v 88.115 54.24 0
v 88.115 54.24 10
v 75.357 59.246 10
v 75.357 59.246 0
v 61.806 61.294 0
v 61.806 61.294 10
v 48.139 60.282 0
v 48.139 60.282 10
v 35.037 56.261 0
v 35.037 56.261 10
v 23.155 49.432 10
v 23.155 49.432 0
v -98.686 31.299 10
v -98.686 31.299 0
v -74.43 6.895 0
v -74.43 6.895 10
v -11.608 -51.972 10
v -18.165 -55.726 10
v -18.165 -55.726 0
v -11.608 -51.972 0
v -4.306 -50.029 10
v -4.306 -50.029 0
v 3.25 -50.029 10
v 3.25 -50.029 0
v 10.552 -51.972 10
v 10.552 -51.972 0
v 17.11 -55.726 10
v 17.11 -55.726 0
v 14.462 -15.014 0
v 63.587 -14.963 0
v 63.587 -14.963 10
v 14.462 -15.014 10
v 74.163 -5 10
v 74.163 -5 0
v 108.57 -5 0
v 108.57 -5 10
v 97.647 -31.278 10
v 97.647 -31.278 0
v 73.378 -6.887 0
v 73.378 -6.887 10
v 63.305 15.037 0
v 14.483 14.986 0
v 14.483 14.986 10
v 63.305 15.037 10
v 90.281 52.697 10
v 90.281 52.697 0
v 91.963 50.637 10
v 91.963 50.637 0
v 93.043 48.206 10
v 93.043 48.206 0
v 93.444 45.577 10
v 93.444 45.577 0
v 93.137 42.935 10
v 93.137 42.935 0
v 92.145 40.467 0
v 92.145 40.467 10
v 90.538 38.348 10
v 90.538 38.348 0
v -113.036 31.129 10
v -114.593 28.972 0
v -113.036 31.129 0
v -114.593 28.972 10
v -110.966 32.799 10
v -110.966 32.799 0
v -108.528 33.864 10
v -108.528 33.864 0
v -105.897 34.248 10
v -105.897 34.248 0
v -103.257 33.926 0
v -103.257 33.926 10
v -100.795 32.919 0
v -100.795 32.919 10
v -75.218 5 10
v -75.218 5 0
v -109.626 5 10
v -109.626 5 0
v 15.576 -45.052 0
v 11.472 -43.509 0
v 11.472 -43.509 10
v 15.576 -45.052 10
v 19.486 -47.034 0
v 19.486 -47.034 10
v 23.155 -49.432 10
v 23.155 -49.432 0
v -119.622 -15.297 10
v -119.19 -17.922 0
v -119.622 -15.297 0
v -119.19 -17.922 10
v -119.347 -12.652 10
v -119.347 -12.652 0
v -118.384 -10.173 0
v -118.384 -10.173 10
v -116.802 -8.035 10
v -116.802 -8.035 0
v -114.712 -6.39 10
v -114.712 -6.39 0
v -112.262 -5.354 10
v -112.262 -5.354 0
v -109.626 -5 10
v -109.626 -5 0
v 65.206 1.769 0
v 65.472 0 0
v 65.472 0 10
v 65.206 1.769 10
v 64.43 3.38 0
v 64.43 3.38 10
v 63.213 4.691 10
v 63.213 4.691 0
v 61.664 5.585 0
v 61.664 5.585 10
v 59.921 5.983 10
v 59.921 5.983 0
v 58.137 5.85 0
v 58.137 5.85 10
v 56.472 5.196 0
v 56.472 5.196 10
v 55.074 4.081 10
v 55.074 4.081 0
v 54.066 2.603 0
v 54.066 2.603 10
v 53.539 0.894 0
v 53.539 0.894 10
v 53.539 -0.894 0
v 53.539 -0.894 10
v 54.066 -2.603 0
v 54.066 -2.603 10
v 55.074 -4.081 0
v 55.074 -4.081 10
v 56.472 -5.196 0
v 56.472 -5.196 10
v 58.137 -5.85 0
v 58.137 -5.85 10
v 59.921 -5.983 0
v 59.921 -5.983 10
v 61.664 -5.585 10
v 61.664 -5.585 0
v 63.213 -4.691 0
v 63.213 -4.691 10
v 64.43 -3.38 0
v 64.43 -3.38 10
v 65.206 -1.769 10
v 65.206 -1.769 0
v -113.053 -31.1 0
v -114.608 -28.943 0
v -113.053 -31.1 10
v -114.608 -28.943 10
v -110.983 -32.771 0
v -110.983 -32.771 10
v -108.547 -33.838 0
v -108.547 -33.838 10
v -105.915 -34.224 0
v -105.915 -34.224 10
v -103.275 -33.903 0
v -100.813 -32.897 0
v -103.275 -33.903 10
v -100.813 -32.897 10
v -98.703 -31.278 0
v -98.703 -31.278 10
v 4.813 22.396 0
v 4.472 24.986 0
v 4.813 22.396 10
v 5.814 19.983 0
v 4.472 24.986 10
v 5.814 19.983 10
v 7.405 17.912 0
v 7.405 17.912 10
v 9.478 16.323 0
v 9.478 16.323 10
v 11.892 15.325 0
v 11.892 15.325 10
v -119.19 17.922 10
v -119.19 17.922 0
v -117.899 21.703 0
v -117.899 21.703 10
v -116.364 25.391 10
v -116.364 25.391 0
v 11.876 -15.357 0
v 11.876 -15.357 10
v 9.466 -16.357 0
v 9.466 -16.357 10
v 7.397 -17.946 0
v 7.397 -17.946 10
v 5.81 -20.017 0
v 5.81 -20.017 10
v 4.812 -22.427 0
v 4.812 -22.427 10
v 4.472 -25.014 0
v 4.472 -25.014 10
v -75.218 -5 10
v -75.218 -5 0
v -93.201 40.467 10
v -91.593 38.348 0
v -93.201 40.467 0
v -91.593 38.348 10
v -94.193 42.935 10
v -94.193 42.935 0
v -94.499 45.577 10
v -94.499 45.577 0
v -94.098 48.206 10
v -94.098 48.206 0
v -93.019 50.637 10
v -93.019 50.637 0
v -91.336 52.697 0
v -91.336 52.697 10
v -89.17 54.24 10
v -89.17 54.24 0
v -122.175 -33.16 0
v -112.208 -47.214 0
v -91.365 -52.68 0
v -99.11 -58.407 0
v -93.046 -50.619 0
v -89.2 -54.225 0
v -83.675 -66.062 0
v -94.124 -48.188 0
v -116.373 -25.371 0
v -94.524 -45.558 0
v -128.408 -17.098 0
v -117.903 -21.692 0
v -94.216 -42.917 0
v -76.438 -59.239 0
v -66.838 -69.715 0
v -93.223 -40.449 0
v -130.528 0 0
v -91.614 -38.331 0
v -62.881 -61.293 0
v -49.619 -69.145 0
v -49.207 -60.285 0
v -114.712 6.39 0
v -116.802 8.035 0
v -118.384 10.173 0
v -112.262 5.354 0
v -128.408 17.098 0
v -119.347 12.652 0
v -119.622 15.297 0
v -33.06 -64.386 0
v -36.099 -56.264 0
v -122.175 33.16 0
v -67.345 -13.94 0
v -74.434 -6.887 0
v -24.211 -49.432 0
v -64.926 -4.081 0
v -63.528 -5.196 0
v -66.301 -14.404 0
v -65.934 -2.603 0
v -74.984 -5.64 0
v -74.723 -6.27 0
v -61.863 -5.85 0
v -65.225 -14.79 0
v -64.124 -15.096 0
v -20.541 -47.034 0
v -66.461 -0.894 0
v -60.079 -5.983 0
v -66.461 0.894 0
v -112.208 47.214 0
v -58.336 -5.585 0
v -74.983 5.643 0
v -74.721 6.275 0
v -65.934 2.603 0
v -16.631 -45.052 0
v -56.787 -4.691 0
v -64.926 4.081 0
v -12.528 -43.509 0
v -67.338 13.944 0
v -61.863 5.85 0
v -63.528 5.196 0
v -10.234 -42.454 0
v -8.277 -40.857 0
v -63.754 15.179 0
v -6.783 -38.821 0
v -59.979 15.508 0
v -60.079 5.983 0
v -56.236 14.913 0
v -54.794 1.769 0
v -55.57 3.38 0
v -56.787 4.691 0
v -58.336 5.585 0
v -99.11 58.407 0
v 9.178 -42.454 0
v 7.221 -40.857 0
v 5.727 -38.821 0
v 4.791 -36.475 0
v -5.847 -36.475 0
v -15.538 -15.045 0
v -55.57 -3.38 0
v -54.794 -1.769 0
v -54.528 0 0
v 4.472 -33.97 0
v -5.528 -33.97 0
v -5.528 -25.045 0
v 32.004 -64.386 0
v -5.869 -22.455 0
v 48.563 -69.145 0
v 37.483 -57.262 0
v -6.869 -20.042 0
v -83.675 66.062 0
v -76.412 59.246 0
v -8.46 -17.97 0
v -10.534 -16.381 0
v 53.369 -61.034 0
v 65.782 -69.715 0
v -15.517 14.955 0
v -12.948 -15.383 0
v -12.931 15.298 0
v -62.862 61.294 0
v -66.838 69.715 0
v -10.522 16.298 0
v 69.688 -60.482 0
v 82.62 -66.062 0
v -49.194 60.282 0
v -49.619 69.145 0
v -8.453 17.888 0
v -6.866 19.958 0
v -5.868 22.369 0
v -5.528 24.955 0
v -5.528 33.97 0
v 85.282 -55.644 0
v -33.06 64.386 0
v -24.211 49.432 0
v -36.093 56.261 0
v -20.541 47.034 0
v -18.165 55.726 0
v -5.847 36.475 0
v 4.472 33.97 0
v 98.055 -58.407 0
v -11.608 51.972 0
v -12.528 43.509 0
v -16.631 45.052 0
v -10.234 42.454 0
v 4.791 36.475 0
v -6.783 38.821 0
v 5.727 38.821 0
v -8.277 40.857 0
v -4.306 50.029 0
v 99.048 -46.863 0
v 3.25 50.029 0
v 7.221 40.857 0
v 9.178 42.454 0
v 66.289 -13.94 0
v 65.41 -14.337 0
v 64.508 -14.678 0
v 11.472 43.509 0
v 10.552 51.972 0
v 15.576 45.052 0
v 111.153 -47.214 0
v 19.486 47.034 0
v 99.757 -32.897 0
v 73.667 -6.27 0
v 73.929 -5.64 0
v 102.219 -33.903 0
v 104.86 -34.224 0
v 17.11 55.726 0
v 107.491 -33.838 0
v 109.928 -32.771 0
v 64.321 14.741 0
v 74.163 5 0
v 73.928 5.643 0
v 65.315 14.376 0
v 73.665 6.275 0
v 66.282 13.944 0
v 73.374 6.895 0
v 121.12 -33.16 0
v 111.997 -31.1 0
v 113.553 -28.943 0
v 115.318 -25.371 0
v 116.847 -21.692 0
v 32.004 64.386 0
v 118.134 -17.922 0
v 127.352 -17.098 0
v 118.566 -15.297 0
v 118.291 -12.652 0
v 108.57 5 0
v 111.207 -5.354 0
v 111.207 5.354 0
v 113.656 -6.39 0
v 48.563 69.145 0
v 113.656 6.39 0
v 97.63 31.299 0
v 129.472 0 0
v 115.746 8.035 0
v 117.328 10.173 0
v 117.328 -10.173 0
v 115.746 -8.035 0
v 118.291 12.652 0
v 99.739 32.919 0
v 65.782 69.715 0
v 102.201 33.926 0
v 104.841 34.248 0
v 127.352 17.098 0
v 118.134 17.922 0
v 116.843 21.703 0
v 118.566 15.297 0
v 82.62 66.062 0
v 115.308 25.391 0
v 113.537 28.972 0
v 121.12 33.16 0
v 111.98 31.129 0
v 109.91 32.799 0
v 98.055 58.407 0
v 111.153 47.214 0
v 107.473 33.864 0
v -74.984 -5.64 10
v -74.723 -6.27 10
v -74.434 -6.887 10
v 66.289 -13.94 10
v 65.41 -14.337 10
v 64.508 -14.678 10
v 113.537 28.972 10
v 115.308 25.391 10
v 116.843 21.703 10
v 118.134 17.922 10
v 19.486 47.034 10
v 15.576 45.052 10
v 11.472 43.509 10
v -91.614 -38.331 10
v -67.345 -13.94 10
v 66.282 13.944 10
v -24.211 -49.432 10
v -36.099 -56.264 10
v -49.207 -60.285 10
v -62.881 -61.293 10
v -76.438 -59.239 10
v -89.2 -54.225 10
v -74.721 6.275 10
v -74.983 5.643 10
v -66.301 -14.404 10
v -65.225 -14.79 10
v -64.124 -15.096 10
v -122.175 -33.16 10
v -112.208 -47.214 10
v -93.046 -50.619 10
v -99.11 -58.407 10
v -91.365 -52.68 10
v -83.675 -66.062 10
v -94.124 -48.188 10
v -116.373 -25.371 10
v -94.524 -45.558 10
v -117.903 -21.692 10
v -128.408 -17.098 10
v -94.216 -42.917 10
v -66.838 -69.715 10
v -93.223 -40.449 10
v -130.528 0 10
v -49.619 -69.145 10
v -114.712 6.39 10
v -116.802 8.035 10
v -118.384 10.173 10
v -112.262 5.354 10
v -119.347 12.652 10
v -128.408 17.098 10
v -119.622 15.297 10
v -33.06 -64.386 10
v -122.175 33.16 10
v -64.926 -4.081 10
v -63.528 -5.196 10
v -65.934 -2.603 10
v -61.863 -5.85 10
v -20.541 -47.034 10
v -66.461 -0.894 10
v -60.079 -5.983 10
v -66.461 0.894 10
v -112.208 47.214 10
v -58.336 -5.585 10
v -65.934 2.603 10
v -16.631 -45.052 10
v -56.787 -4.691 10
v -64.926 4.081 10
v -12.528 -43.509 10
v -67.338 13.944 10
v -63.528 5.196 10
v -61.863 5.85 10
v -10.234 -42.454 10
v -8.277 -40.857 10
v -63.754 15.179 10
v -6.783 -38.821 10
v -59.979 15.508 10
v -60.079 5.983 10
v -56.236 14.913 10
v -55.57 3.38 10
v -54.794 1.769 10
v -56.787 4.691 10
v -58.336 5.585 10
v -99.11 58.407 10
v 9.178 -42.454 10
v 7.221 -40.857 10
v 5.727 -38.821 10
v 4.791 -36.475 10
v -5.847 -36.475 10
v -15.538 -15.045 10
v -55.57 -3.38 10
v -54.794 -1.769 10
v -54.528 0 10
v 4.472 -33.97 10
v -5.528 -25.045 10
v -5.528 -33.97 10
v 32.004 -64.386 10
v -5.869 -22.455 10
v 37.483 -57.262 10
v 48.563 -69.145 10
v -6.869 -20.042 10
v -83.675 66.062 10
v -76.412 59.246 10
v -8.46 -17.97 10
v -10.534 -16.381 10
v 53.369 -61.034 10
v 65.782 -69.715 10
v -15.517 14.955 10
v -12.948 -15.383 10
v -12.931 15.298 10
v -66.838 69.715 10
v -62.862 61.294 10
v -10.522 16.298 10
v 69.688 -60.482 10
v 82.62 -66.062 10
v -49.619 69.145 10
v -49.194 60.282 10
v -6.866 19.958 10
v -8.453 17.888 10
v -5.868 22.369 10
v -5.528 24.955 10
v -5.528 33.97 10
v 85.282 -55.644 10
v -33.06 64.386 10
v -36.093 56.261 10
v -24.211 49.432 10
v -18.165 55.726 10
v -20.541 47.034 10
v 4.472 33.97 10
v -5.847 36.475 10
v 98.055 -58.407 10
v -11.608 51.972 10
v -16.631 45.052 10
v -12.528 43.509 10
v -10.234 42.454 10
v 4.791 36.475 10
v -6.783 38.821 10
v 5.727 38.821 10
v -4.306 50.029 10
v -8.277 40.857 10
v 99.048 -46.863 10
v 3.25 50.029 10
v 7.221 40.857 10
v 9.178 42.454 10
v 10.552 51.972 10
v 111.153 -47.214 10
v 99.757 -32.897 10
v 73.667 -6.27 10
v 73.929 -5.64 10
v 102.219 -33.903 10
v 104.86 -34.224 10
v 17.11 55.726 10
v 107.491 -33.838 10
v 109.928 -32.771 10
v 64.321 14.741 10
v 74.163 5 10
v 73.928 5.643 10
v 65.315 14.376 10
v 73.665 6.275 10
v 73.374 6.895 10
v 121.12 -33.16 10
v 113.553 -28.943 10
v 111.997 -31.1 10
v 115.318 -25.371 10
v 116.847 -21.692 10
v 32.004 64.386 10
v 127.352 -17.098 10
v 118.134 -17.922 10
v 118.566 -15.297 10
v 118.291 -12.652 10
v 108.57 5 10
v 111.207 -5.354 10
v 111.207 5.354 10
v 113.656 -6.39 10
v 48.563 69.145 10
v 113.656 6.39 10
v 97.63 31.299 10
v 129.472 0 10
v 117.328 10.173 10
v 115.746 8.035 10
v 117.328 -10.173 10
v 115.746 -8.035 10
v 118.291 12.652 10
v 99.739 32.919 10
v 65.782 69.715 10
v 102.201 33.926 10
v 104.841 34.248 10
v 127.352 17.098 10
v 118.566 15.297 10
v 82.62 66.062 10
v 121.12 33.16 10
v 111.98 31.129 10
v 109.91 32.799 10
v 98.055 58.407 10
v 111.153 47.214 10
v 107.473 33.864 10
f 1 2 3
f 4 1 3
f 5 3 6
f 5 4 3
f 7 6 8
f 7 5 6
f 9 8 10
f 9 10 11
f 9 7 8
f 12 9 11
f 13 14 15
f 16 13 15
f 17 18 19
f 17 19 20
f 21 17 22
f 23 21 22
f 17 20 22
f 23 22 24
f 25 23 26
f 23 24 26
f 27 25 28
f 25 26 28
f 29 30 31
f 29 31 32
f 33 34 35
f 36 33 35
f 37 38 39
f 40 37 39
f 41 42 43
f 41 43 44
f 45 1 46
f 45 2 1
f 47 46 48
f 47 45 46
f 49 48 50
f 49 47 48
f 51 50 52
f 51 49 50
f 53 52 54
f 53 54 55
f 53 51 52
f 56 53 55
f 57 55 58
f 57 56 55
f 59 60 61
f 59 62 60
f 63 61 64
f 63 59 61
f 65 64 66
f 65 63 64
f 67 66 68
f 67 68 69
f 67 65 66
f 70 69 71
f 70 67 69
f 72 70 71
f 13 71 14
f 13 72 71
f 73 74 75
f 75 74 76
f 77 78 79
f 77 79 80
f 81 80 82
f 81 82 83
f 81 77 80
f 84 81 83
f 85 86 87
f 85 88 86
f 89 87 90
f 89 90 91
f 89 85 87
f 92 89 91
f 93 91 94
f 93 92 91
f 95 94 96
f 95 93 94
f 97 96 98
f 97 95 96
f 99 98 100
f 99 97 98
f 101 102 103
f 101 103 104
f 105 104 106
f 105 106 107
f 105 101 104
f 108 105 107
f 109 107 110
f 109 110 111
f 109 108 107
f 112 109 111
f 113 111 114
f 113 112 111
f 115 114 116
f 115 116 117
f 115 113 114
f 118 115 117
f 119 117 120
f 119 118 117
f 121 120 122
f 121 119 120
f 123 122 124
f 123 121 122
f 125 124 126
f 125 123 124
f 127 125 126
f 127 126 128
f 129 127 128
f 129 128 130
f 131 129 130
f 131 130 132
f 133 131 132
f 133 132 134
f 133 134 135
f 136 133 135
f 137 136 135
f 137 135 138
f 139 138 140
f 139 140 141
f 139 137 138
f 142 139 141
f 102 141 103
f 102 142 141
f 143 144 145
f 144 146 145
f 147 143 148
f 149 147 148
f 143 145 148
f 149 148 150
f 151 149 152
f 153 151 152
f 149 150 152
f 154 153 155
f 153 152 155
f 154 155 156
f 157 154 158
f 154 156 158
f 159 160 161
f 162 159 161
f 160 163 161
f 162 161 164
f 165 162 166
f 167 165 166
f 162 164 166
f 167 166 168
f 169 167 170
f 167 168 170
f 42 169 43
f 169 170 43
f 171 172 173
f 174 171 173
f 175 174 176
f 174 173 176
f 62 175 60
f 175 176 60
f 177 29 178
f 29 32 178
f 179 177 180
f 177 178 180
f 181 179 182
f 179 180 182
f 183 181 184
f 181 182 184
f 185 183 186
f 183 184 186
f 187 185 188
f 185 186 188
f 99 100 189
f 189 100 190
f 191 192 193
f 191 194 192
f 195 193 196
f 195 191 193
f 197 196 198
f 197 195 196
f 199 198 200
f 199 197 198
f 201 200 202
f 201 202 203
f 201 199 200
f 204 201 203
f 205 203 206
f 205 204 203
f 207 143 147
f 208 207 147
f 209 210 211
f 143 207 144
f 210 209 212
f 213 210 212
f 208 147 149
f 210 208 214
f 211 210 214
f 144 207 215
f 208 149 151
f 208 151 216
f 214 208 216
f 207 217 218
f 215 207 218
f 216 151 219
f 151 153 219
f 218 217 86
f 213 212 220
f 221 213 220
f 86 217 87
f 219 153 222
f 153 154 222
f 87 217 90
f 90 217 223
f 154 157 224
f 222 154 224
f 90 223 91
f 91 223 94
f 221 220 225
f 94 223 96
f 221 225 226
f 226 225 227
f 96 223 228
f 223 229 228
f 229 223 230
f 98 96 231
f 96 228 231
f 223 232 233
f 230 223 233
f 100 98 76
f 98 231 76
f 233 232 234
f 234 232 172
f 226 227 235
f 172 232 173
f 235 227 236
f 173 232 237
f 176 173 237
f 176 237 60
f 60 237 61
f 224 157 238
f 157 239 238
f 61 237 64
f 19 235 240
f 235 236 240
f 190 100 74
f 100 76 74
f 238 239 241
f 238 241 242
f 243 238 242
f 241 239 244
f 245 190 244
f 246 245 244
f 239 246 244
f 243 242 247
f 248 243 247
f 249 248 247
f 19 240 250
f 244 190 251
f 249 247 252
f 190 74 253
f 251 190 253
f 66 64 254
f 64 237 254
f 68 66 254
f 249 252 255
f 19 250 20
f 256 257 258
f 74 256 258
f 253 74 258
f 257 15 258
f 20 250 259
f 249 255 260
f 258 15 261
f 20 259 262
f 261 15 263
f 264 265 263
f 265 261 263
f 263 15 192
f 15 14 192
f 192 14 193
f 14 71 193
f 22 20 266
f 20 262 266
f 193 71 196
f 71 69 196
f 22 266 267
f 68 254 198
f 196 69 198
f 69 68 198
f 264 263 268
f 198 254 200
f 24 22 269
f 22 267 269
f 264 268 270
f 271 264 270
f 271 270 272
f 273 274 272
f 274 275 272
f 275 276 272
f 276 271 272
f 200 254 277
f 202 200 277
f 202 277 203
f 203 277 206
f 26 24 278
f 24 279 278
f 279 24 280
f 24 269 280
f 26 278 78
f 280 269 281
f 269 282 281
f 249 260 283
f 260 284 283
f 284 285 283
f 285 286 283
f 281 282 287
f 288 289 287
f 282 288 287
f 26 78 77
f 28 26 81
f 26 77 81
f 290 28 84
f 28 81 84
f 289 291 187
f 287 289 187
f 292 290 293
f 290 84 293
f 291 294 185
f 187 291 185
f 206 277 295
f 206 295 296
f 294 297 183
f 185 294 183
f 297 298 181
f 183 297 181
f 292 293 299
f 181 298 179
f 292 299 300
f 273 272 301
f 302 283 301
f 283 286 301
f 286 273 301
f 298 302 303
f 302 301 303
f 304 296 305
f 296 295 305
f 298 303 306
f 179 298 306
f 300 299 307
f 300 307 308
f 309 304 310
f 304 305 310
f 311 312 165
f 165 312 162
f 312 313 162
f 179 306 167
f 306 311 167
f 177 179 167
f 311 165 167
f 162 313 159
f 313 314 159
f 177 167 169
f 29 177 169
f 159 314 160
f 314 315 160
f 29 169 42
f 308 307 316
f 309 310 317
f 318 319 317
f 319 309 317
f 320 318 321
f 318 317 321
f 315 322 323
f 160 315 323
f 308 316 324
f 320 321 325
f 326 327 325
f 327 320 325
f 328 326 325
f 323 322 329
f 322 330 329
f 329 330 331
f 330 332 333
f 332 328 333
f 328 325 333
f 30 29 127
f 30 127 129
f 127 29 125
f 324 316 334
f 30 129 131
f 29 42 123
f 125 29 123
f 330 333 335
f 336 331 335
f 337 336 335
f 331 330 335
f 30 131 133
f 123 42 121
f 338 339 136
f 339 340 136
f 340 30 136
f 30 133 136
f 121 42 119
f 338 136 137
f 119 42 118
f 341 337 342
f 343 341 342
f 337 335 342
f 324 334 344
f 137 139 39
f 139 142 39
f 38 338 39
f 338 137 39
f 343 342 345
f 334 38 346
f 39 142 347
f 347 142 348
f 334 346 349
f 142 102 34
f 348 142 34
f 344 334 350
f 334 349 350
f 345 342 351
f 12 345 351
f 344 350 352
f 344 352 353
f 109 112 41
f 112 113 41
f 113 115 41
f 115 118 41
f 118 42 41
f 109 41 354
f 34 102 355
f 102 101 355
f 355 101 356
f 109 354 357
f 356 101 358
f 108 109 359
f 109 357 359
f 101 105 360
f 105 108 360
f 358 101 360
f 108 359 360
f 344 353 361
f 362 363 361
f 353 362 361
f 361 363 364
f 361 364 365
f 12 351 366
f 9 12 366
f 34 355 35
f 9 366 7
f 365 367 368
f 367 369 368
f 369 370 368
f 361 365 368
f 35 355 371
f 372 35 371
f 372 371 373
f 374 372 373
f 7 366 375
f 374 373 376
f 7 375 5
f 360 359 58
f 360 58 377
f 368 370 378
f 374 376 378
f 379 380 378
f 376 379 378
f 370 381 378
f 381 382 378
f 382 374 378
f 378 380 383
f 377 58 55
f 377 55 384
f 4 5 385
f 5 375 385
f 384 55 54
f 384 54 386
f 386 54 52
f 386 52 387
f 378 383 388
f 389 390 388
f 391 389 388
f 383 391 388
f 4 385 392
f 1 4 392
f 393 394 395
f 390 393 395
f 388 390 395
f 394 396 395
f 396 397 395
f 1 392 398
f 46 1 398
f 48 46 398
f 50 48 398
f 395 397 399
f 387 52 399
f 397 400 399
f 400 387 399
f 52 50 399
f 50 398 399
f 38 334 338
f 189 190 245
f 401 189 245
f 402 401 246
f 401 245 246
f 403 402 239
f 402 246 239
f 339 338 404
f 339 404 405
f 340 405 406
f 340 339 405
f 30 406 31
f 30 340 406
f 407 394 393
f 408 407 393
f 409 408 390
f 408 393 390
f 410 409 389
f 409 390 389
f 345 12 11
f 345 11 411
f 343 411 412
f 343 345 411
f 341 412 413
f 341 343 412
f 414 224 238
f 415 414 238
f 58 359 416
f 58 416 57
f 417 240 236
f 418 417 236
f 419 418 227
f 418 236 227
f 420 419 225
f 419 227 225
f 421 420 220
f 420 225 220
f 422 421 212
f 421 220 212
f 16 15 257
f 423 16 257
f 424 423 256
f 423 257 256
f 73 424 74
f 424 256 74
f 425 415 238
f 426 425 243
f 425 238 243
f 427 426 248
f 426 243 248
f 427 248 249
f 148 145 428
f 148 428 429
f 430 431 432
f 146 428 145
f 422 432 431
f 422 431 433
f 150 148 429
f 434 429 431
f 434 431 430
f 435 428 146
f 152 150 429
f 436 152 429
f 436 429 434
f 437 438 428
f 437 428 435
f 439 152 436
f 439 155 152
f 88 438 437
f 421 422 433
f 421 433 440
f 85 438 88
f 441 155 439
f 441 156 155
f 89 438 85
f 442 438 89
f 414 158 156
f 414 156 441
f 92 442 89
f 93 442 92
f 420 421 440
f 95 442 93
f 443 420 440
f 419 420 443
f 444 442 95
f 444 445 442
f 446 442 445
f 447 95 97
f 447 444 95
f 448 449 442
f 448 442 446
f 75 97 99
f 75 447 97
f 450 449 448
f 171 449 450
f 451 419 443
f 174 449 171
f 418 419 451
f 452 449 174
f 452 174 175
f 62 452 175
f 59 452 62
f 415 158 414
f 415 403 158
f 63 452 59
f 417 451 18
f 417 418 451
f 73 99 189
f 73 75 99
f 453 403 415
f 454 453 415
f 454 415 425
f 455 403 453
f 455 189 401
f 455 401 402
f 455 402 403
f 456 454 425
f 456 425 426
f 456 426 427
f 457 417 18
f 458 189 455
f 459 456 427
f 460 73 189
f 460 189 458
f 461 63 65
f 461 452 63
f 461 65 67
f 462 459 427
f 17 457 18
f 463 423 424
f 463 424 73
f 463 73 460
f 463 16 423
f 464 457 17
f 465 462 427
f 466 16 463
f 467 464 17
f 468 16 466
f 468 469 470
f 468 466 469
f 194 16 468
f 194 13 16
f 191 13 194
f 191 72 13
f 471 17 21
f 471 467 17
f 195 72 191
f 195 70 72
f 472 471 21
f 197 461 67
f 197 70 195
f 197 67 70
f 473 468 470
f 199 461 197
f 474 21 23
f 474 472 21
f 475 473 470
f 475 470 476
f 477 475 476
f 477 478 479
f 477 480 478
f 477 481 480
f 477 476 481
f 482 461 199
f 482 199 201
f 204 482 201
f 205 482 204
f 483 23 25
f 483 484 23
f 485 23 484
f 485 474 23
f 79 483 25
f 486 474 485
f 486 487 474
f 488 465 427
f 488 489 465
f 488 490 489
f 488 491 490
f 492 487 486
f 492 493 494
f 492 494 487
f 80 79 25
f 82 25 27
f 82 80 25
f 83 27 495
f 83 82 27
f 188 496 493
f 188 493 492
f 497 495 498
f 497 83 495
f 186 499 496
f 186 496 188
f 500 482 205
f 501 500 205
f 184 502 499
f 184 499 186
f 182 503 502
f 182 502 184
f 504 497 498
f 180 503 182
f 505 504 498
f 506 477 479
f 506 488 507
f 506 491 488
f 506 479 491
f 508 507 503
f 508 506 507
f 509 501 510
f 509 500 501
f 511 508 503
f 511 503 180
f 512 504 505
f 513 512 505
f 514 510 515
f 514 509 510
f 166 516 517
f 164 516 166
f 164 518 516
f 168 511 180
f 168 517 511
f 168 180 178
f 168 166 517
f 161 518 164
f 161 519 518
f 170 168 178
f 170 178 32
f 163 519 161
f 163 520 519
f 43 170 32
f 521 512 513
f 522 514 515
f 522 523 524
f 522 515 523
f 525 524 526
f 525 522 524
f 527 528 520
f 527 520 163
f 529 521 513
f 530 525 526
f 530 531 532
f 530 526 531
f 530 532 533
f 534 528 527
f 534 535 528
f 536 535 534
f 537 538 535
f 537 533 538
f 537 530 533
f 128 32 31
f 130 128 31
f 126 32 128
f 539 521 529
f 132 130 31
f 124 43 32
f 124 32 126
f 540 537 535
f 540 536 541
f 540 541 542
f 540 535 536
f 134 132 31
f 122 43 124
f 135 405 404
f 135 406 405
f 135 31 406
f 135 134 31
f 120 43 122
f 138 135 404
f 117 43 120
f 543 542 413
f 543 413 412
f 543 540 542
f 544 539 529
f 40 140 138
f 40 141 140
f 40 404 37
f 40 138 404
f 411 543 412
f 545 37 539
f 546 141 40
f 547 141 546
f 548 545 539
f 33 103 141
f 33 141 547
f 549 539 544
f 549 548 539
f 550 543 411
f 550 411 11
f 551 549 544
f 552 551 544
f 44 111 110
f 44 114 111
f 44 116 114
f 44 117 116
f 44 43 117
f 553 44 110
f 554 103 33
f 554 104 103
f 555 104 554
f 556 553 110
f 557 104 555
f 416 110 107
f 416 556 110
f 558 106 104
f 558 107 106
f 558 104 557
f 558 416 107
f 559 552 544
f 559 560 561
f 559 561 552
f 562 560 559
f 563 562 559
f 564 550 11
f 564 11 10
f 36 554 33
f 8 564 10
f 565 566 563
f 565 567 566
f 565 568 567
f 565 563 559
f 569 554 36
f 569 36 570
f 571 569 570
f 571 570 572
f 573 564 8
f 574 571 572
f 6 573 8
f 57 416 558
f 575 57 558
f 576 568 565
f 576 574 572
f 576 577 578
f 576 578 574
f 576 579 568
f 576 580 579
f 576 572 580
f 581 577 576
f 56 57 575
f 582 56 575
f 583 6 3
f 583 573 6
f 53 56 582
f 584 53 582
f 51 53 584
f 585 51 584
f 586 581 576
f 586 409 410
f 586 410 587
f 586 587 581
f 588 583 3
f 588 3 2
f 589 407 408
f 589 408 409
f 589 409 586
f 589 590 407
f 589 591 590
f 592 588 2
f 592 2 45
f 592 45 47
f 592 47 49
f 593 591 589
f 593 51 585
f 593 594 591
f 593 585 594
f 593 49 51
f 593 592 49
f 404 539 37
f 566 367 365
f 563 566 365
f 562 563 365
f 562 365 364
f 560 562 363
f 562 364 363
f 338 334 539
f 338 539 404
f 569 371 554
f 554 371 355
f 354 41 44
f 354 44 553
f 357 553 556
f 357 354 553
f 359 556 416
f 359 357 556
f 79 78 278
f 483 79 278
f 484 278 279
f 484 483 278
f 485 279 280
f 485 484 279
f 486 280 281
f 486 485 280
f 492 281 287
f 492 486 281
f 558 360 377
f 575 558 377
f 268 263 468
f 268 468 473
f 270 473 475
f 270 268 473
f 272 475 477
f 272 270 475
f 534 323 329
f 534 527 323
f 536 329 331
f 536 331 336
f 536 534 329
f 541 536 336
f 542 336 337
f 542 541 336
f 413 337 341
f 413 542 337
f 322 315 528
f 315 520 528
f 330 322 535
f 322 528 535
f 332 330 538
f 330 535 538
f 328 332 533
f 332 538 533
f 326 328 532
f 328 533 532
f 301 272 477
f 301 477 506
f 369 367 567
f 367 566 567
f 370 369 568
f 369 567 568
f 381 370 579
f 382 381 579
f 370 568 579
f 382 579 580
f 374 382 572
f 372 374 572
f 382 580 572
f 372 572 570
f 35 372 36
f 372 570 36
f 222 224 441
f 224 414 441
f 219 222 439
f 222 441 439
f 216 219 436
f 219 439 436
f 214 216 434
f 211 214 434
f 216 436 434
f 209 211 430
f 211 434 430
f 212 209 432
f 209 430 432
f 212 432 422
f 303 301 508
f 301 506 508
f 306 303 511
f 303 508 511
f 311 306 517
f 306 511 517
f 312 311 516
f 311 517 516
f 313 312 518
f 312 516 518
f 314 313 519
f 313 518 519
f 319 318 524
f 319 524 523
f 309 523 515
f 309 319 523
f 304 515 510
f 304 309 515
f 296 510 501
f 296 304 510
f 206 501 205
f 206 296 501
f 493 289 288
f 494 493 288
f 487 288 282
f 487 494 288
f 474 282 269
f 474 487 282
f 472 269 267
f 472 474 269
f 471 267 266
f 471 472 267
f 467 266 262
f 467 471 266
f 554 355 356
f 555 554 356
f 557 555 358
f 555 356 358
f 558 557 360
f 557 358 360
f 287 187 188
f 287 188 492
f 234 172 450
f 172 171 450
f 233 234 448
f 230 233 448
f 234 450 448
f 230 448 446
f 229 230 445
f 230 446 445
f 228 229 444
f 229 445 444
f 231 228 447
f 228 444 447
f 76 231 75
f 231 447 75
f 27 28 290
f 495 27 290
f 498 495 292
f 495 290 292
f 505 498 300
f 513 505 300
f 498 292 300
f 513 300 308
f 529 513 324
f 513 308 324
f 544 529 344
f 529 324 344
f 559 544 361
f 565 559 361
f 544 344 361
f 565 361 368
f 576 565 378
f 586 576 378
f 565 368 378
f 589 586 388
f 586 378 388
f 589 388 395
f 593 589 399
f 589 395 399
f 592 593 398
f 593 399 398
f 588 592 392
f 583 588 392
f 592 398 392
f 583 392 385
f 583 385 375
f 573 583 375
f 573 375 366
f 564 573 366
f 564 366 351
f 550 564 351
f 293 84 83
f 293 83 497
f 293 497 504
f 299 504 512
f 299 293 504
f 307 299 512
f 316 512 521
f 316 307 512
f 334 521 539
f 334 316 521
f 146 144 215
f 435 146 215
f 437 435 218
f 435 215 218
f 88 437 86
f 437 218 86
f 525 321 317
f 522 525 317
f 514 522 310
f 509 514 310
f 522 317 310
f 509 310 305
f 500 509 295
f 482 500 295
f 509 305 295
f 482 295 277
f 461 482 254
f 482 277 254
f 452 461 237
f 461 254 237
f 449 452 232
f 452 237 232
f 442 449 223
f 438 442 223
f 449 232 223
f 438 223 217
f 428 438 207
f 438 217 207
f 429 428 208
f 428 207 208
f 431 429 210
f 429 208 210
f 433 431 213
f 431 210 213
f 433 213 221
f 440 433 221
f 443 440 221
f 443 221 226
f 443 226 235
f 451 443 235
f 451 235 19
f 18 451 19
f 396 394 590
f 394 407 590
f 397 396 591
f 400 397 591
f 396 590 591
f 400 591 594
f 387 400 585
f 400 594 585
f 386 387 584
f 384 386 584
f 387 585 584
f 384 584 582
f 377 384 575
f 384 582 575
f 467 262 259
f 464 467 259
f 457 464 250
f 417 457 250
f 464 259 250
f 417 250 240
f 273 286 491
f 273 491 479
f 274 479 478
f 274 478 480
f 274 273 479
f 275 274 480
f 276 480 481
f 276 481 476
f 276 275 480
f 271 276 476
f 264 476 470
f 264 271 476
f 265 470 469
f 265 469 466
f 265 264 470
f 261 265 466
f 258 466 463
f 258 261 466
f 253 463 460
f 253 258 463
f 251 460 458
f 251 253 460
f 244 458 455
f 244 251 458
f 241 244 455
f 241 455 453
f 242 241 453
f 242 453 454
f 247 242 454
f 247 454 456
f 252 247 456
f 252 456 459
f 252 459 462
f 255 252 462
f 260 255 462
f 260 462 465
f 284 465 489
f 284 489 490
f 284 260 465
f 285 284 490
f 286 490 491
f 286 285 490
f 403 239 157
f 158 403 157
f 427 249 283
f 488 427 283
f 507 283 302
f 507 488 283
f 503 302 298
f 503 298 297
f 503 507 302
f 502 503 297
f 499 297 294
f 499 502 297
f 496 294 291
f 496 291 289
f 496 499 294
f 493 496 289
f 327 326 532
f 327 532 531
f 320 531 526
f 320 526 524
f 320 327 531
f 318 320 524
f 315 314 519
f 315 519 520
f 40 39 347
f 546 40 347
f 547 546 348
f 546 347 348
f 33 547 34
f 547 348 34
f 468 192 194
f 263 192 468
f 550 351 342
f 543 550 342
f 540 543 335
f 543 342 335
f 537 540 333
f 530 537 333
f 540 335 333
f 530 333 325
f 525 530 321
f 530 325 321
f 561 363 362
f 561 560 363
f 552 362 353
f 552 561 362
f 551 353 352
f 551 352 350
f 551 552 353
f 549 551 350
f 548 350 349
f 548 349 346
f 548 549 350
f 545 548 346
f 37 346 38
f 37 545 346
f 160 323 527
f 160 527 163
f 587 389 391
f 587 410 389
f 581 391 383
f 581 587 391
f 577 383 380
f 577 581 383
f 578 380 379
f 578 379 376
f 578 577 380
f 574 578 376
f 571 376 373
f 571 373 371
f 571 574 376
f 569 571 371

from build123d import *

# Parameters (mm, degrees)
SKETCH1_R           = 6
BOSS_EXTRUDE2_DEPTH = 10
FILLET2_R           = 10


with BuildPart() as part:
    # Sketch1 → Boss-Extrude2 (new body)
    with BuildSketch(Plane.XY):
        with BuildLine():
            ThreePointArc((-18.165151778, 55.726150839), (-130.527825355, 0), (-18.165151778, -55.726150839))
            ThreePointArc((-18.165151778, -55.726150839), (-0.527825355, -49.783359328), (17.109501067, -55.726150839))
            ThreePointArc((17.109501067, -55.726150839), (129.472174645, 0), (17.109501067, 55.726150839))
            ThreePointArc((17.109501067, 55.726150839), (-0.527825355, 49.783359328), (-18.165151778, 55.726150839))
        make_face()
        with Locations((-60.527825355, 0)):
            Circle(SKETCH1_R, mode=Mode.SUBTRACT)
        with Locations((59.472174645, 0)):
            Circle(SKETCH1_R, mode=Mode.SUBTRACT)
        with BuildLine():
            Line((-56.235975609, 14.912672635), (-5.527825355, 14.965504266))
            Line((-5.527825355, 14.965504266), (-5.527825355, 41.980686961))
            ThreePointArc((-5.527825355, 41.980686961), (-15.345309937, 44.512654742), (-24.210827936, 49.431643964))
            ThreePointArc((-24.210827936, 49.431643964), (-62.58583764, 61.303966527), (-100.078223296, 46.884728315))
            Line((-100.078223296, 46.884728315), (-67.337537784, 13.944016494))
            ThreePointArc((-67.337537784, 13.944016494), (-61.876707041, 15.459246345), (-56.235975609, 14.912672635))
        make_face(mode=Mode.SUBTRACT)
        with BuildLine():
            Line((-64.123905218, -15.095561897), (-5.527825355, -15.034512017))
            Line((-5.527825355, -15.034512017), (-5.527825355, -41.980686961))
            ThreePointArc((-5.527825355, -41.980686961), (-15.345309937, -44.512654742), (-24.210827936, -49.431643964))
            ThreePointArc((-24.210827936, -49.431643964), (-62.602390706, -61.303408593), (-100.103536918, -46.863362884))
            Line((-100.103536918, -46.863362884), (-67.345067046, -13.940336979))
            ThreePointArc((-67.345067046, -13.940336979), (-65.766427516, -14.607012931), (-64.123905218, -15.095561897))
        make_face(mode=Mode.SUBTRACT)
        with BuildLine():
            Line((-107.170792468, 39.835227443), (-74.430106955, 6.894515622))
            ThreePointArc((-74.430106955, 6.894515622), (-74.855512615, 5.960298411), (-75.218222877, 5))
            Line((-75.218222877, 5), (-121.6621997, 5))
            ThreePointArc((-121.6621997, 5), (-117.161402857, 23.559491206), (-107.170792468, 39.835227443))
        make_face(mode=Mode.SUBTRACT)
        with BuildLine():
            Line((-121.6621997, -5), (-75.218222877, -5))
            ThreePointArc((-75.218222877, -5), (-74.857121477, -5.956429468), (-74.433828207, -6.887006899))
            Line((-74.433828207, -6.887006899), (-107.192298079, -39.810032805))
            ThreePointArc((-107.192298079, -39.810032805), (-117.167762266, -23.544198292), (-121.6621997, -5))
        make_face(mode=Mode.SUBTRACT)
        with BuildLine():
            Line((4.472174645, 41.980686961), (4.472174645, 14.975923031))
            Line((4.472174645, 14.975923031), (63.304903434, 15.03721947))
            ThreePointArc((63.304903434, 15.03721947), (64.821395332, 14.56686711), (66.281887074, 13.944016494))
            Line((66.281887074, 13.944016494), (99.022572586, 46.884728315))
            ThreePointArc((99.022572586, 46.884728315), (61.530186929, 61.303966527), (23.155177226, 49.431643964))
            ThreePointArc((23.155177226, 49.431643964), (14.289659226, 44.512654742), (4.472174645, 41.980686961))
        make_face(mode=Mode.SUBTRACT)
        with BuildLine():
            Line((99.047886208, -46.863362884), (66.289416336, -13.940336979))
            ThreePointArc((66.289416336, -13.940336979), (64.962019266, -14.514454361), (63.586938832, -14.962502967))
            Line((63.586938832, -14.962502967), (4.472174645, -15.024093252))
            Line((4.472174645, -15.024093252), (4.472174645, -41.980686961))
            ThreePointArc((4.472174645, -41.980686961), (14.289659226, -44.512654742), (23.155177226, -49.431643964))
            ThreePointArc((23.155177226, -49.431643964), (61.546739995, -61.303408593), (99.047886208, -46.863362884))
        make_face(mode=Mode.SUBTRACT)
        with BuildLine():
            Line((106.136647368, -39.810032805), (73.378177497, -6.887006899))
            ThreePointArc((73.378177497, -6.887006899), (73.801470767, -5.956429468), (74.162572167, -5))
            Line((74.162572167, -5), (120.606548989, -5))
            ThreePointArc((120.606548989, -5), (116.112111556, -23.544198292), (106.136647368, -39.810032805))
        make_face(mode=Mode.SUBTRACT)
        with BuildLine():
            Line((120.606548989, 5), (74.162572167, 5))
            ThreePointArc((74.162572167, 5), (73.799861904, 5.960298411), (73.374456245, 6.894515622))
            Line((73.374456245, 6.894515622), (106.115141757, 39.835227443))
            ThreePointArc((106.115141757, 39.835227443), (116.105752147, 23.559491206), (120.606548989, 5))
        make_face(mode=Mode.SUBTRACT)
    extrude(amount=BOSS_EXTRUDE2_DEPTH)

    # Fillet2
    fillet2_edges = [part.edges().sort_by_distance(p)[0] for p in [
        (4.472174645, -15.024093252, 5),
        (4.472174645, -41.980686961, 5),
        (106.136647368, -39.810032805, 5),
        (120.606548989, -5, 5),
        (120.606548989, 5, 5),
        (106.115141757, 39.835227443, 5),
        (-100.103536918, -46.863362884, 5),
        (-5.527825355, -41.980686961, 5),
        (-5.527825355, -15.034512017, 5),
        (-121.6621997, -5, 5),
        (-107.192298079, -39.810032805, 5),
        (-107.170792468, 39.835227443, 5),
        (-121.6621997, 5, 5),
        (-5.527825355, 14.965504266, 5),
        (-5.527825355, 41.980686961, 5),
        (-100.078223296, 46.884728315, 5),
        (99.022572586, 46.884728315, 5),
        (4.472174645, 41.980686961, 5),
        (4.472174645, 14.975923031, 5),
    ]]
    fillet(fillet2_edges, radius=FILLET2_R)


solid = part.part
